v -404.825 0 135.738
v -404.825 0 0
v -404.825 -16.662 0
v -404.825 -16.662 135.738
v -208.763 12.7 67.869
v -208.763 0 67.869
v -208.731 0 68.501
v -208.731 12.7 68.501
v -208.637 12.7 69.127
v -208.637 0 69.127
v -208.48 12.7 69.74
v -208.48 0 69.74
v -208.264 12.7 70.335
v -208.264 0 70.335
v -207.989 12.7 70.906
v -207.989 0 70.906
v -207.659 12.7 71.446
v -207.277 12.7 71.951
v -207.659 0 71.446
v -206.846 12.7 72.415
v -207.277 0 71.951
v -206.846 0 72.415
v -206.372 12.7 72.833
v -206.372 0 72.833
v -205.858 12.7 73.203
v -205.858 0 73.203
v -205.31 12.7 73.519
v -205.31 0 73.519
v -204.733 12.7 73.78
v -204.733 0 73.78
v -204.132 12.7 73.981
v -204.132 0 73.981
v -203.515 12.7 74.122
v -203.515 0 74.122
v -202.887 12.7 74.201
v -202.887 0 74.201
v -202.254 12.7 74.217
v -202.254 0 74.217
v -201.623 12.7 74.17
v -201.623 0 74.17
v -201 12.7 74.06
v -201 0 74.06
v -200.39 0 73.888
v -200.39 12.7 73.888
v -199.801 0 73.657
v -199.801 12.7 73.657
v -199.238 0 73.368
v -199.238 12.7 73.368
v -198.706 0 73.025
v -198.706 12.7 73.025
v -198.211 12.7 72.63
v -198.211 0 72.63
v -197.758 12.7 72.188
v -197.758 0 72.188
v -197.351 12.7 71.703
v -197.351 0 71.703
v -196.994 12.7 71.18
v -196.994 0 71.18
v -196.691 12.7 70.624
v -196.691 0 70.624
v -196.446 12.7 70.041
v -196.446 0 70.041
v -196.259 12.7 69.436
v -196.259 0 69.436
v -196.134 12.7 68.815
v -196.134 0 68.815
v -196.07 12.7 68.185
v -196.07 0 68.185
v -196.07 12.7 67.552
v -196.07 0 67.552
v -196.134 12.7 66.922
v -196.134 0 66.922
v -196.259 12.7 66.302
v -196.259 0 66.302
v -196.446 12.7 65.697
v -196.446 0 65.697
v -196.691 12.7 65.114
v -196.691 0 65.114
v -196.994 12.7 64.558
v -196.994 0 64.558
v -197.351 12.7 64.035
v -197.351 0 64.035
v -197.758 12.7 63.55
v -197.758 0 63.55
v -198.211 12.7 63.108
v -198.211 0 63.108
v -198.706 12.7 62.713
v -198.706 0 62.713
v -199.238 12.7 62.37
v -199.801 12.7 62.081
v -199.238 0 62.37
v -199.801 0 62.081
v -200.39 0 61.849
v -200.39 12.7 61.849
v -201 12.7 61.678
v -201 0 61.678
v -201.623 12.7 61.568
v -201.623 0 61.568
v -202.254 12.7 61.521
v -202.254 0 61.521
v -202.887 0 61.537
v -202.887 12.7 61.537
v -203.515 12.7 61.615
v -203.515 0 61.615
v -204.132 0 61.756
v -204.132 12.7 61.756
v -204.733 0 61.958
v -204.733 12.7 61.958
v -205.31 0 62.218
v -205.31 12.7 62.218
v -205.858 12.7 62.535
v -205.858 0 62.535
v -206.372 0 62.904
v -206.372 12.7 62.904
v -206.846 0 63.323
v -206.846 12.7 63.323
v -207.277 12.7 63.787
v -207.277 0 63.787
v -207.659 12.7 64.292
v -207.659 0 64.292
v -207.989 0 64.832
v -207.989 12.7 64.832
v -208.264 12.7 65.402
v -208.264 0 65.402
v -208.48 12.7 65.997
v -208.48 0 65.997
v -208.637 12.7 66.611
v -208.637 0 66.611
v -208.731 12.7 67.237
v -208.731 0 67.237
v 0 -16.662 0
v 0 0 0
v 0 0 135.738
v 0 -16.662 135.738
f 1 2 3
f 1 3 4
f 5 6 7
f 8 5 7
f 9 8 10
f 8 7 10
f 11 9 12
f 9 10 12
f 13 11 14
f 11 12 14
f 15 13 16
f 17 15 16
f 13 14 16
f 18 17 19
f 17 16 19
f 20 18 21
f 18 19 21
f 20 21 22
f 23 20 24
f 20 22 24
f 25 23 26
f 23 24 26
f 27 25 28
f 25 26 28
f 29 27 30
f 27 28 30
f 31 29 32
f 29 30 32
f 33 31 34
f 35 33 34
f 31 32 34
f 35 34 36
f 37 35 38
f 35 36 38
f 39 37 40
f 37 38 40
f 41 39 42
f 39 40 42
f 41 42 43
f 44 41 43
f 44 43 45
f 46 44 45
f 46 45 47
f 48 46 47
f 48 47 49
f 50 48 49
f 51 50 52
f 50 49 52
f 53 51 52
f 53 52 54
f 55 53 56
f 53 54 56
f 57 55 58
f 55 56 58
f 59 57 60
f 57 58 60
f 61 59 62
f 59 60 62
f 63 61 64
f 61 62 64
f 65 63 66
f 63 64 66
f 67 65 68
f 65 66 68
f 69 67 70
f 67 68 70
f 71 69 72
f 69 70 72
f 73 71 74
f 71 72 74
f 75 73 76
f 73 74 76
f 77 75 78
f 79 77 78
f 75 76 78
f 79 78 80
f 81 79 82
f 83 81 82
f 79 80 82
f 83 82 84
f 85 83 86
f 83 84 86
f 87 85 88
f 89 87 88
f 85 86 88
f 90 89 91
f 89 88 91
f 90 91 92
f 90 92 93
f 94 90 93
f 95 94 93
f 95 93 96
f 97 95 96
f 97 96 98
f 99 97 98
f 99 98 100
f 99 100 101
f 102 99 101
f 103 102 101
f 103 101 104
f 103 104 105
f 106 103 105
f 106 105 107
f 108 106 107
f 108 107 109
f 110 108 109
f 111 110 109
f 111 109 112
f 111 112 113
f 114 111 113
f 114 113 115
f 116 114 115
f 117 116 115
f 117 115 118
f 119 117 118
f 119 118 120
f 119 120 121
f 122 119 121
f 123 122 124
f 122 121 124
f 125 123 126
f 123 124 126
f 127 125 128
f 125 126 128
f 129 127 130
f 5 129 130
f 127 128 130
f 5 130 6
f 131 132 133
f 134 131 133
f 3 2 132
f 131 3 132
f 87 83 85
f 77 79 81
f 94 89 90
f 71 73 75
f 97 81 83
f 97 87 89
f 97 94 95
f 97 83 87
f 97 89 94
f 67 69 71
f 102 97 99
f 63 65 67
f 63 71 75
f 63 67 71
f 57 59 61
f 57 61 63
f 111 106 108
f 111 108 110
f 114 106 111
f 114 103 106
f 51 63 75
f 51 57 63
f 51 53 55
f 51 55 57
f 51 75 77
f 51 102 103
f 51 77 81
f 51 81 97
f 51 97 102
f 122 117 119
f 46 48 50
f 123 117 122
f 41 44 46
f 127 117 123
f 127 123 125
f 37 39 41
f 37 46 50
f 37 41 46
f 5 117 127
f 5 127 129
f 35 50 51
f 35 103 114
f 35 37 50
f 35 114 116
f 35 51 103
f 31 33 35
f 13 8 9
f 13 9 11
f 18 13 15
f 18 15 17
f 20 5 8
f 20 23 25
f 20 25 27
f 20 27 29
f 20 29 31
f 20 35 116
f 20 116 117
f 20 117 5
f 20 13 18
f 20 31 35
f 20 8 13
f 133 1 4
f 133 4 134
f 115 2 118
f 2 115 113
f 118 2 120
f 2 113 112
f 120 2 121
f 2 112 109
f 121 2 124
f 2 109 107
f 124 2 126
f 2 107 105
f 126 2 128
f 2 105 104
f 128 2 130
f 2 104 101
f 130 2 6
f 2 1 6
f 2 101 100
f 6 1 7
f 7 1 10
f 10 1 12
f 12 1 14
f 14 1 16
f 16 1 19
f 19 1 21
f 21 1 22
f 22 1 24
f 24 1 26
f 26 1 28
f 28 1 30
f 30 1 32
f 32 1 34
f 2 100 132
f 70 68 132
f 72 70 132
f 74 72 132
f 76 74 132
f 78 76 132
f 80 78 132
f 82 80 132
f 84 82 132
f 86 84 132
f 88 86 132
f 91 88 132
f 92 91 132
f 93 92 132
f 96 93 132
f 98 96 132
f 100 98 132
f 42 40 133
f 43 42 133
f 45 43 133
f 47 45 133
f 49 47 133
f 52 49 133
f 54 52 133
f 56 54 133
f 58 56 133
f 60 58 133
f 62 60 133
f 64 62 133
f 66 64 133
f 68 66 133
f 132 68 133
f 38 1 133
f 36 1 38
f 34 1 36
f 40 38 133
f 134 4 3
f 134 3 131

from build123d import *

# Parameters (mm, degrees)
F1_W     = 404.8252
F1_H     = 135.7376
F2_DEPTH = 16.6624
F3_R     = 6.35
F4_DEPTH = 12.7


# Not quite as in the source:
# - a variable given as a bare number and used for a length is read in inches; the dataset says mm whatever the document's units were


with BuildPart() as f2:
    # F1 (on Front) → F2 (new body)
    with BuildSketch(Plane.XZ):
        with Locations((-202.4126, 67.8688)):
            Rectangle(F1_W, F1_H)
    extrude(amount=F2_DEPTH)

    # F3 (on face) → F4 (join)
    with BuildSketch(Plane(origin=(0, 0, 0), x_dir=(-1, 0, 0), z_dir=(0, 1, 0))):
        with Locations((202.4126, 67.8688)):
            Circle(F3_R)
    extrude(amount=F4_DEPTH)


solid = f2.part
